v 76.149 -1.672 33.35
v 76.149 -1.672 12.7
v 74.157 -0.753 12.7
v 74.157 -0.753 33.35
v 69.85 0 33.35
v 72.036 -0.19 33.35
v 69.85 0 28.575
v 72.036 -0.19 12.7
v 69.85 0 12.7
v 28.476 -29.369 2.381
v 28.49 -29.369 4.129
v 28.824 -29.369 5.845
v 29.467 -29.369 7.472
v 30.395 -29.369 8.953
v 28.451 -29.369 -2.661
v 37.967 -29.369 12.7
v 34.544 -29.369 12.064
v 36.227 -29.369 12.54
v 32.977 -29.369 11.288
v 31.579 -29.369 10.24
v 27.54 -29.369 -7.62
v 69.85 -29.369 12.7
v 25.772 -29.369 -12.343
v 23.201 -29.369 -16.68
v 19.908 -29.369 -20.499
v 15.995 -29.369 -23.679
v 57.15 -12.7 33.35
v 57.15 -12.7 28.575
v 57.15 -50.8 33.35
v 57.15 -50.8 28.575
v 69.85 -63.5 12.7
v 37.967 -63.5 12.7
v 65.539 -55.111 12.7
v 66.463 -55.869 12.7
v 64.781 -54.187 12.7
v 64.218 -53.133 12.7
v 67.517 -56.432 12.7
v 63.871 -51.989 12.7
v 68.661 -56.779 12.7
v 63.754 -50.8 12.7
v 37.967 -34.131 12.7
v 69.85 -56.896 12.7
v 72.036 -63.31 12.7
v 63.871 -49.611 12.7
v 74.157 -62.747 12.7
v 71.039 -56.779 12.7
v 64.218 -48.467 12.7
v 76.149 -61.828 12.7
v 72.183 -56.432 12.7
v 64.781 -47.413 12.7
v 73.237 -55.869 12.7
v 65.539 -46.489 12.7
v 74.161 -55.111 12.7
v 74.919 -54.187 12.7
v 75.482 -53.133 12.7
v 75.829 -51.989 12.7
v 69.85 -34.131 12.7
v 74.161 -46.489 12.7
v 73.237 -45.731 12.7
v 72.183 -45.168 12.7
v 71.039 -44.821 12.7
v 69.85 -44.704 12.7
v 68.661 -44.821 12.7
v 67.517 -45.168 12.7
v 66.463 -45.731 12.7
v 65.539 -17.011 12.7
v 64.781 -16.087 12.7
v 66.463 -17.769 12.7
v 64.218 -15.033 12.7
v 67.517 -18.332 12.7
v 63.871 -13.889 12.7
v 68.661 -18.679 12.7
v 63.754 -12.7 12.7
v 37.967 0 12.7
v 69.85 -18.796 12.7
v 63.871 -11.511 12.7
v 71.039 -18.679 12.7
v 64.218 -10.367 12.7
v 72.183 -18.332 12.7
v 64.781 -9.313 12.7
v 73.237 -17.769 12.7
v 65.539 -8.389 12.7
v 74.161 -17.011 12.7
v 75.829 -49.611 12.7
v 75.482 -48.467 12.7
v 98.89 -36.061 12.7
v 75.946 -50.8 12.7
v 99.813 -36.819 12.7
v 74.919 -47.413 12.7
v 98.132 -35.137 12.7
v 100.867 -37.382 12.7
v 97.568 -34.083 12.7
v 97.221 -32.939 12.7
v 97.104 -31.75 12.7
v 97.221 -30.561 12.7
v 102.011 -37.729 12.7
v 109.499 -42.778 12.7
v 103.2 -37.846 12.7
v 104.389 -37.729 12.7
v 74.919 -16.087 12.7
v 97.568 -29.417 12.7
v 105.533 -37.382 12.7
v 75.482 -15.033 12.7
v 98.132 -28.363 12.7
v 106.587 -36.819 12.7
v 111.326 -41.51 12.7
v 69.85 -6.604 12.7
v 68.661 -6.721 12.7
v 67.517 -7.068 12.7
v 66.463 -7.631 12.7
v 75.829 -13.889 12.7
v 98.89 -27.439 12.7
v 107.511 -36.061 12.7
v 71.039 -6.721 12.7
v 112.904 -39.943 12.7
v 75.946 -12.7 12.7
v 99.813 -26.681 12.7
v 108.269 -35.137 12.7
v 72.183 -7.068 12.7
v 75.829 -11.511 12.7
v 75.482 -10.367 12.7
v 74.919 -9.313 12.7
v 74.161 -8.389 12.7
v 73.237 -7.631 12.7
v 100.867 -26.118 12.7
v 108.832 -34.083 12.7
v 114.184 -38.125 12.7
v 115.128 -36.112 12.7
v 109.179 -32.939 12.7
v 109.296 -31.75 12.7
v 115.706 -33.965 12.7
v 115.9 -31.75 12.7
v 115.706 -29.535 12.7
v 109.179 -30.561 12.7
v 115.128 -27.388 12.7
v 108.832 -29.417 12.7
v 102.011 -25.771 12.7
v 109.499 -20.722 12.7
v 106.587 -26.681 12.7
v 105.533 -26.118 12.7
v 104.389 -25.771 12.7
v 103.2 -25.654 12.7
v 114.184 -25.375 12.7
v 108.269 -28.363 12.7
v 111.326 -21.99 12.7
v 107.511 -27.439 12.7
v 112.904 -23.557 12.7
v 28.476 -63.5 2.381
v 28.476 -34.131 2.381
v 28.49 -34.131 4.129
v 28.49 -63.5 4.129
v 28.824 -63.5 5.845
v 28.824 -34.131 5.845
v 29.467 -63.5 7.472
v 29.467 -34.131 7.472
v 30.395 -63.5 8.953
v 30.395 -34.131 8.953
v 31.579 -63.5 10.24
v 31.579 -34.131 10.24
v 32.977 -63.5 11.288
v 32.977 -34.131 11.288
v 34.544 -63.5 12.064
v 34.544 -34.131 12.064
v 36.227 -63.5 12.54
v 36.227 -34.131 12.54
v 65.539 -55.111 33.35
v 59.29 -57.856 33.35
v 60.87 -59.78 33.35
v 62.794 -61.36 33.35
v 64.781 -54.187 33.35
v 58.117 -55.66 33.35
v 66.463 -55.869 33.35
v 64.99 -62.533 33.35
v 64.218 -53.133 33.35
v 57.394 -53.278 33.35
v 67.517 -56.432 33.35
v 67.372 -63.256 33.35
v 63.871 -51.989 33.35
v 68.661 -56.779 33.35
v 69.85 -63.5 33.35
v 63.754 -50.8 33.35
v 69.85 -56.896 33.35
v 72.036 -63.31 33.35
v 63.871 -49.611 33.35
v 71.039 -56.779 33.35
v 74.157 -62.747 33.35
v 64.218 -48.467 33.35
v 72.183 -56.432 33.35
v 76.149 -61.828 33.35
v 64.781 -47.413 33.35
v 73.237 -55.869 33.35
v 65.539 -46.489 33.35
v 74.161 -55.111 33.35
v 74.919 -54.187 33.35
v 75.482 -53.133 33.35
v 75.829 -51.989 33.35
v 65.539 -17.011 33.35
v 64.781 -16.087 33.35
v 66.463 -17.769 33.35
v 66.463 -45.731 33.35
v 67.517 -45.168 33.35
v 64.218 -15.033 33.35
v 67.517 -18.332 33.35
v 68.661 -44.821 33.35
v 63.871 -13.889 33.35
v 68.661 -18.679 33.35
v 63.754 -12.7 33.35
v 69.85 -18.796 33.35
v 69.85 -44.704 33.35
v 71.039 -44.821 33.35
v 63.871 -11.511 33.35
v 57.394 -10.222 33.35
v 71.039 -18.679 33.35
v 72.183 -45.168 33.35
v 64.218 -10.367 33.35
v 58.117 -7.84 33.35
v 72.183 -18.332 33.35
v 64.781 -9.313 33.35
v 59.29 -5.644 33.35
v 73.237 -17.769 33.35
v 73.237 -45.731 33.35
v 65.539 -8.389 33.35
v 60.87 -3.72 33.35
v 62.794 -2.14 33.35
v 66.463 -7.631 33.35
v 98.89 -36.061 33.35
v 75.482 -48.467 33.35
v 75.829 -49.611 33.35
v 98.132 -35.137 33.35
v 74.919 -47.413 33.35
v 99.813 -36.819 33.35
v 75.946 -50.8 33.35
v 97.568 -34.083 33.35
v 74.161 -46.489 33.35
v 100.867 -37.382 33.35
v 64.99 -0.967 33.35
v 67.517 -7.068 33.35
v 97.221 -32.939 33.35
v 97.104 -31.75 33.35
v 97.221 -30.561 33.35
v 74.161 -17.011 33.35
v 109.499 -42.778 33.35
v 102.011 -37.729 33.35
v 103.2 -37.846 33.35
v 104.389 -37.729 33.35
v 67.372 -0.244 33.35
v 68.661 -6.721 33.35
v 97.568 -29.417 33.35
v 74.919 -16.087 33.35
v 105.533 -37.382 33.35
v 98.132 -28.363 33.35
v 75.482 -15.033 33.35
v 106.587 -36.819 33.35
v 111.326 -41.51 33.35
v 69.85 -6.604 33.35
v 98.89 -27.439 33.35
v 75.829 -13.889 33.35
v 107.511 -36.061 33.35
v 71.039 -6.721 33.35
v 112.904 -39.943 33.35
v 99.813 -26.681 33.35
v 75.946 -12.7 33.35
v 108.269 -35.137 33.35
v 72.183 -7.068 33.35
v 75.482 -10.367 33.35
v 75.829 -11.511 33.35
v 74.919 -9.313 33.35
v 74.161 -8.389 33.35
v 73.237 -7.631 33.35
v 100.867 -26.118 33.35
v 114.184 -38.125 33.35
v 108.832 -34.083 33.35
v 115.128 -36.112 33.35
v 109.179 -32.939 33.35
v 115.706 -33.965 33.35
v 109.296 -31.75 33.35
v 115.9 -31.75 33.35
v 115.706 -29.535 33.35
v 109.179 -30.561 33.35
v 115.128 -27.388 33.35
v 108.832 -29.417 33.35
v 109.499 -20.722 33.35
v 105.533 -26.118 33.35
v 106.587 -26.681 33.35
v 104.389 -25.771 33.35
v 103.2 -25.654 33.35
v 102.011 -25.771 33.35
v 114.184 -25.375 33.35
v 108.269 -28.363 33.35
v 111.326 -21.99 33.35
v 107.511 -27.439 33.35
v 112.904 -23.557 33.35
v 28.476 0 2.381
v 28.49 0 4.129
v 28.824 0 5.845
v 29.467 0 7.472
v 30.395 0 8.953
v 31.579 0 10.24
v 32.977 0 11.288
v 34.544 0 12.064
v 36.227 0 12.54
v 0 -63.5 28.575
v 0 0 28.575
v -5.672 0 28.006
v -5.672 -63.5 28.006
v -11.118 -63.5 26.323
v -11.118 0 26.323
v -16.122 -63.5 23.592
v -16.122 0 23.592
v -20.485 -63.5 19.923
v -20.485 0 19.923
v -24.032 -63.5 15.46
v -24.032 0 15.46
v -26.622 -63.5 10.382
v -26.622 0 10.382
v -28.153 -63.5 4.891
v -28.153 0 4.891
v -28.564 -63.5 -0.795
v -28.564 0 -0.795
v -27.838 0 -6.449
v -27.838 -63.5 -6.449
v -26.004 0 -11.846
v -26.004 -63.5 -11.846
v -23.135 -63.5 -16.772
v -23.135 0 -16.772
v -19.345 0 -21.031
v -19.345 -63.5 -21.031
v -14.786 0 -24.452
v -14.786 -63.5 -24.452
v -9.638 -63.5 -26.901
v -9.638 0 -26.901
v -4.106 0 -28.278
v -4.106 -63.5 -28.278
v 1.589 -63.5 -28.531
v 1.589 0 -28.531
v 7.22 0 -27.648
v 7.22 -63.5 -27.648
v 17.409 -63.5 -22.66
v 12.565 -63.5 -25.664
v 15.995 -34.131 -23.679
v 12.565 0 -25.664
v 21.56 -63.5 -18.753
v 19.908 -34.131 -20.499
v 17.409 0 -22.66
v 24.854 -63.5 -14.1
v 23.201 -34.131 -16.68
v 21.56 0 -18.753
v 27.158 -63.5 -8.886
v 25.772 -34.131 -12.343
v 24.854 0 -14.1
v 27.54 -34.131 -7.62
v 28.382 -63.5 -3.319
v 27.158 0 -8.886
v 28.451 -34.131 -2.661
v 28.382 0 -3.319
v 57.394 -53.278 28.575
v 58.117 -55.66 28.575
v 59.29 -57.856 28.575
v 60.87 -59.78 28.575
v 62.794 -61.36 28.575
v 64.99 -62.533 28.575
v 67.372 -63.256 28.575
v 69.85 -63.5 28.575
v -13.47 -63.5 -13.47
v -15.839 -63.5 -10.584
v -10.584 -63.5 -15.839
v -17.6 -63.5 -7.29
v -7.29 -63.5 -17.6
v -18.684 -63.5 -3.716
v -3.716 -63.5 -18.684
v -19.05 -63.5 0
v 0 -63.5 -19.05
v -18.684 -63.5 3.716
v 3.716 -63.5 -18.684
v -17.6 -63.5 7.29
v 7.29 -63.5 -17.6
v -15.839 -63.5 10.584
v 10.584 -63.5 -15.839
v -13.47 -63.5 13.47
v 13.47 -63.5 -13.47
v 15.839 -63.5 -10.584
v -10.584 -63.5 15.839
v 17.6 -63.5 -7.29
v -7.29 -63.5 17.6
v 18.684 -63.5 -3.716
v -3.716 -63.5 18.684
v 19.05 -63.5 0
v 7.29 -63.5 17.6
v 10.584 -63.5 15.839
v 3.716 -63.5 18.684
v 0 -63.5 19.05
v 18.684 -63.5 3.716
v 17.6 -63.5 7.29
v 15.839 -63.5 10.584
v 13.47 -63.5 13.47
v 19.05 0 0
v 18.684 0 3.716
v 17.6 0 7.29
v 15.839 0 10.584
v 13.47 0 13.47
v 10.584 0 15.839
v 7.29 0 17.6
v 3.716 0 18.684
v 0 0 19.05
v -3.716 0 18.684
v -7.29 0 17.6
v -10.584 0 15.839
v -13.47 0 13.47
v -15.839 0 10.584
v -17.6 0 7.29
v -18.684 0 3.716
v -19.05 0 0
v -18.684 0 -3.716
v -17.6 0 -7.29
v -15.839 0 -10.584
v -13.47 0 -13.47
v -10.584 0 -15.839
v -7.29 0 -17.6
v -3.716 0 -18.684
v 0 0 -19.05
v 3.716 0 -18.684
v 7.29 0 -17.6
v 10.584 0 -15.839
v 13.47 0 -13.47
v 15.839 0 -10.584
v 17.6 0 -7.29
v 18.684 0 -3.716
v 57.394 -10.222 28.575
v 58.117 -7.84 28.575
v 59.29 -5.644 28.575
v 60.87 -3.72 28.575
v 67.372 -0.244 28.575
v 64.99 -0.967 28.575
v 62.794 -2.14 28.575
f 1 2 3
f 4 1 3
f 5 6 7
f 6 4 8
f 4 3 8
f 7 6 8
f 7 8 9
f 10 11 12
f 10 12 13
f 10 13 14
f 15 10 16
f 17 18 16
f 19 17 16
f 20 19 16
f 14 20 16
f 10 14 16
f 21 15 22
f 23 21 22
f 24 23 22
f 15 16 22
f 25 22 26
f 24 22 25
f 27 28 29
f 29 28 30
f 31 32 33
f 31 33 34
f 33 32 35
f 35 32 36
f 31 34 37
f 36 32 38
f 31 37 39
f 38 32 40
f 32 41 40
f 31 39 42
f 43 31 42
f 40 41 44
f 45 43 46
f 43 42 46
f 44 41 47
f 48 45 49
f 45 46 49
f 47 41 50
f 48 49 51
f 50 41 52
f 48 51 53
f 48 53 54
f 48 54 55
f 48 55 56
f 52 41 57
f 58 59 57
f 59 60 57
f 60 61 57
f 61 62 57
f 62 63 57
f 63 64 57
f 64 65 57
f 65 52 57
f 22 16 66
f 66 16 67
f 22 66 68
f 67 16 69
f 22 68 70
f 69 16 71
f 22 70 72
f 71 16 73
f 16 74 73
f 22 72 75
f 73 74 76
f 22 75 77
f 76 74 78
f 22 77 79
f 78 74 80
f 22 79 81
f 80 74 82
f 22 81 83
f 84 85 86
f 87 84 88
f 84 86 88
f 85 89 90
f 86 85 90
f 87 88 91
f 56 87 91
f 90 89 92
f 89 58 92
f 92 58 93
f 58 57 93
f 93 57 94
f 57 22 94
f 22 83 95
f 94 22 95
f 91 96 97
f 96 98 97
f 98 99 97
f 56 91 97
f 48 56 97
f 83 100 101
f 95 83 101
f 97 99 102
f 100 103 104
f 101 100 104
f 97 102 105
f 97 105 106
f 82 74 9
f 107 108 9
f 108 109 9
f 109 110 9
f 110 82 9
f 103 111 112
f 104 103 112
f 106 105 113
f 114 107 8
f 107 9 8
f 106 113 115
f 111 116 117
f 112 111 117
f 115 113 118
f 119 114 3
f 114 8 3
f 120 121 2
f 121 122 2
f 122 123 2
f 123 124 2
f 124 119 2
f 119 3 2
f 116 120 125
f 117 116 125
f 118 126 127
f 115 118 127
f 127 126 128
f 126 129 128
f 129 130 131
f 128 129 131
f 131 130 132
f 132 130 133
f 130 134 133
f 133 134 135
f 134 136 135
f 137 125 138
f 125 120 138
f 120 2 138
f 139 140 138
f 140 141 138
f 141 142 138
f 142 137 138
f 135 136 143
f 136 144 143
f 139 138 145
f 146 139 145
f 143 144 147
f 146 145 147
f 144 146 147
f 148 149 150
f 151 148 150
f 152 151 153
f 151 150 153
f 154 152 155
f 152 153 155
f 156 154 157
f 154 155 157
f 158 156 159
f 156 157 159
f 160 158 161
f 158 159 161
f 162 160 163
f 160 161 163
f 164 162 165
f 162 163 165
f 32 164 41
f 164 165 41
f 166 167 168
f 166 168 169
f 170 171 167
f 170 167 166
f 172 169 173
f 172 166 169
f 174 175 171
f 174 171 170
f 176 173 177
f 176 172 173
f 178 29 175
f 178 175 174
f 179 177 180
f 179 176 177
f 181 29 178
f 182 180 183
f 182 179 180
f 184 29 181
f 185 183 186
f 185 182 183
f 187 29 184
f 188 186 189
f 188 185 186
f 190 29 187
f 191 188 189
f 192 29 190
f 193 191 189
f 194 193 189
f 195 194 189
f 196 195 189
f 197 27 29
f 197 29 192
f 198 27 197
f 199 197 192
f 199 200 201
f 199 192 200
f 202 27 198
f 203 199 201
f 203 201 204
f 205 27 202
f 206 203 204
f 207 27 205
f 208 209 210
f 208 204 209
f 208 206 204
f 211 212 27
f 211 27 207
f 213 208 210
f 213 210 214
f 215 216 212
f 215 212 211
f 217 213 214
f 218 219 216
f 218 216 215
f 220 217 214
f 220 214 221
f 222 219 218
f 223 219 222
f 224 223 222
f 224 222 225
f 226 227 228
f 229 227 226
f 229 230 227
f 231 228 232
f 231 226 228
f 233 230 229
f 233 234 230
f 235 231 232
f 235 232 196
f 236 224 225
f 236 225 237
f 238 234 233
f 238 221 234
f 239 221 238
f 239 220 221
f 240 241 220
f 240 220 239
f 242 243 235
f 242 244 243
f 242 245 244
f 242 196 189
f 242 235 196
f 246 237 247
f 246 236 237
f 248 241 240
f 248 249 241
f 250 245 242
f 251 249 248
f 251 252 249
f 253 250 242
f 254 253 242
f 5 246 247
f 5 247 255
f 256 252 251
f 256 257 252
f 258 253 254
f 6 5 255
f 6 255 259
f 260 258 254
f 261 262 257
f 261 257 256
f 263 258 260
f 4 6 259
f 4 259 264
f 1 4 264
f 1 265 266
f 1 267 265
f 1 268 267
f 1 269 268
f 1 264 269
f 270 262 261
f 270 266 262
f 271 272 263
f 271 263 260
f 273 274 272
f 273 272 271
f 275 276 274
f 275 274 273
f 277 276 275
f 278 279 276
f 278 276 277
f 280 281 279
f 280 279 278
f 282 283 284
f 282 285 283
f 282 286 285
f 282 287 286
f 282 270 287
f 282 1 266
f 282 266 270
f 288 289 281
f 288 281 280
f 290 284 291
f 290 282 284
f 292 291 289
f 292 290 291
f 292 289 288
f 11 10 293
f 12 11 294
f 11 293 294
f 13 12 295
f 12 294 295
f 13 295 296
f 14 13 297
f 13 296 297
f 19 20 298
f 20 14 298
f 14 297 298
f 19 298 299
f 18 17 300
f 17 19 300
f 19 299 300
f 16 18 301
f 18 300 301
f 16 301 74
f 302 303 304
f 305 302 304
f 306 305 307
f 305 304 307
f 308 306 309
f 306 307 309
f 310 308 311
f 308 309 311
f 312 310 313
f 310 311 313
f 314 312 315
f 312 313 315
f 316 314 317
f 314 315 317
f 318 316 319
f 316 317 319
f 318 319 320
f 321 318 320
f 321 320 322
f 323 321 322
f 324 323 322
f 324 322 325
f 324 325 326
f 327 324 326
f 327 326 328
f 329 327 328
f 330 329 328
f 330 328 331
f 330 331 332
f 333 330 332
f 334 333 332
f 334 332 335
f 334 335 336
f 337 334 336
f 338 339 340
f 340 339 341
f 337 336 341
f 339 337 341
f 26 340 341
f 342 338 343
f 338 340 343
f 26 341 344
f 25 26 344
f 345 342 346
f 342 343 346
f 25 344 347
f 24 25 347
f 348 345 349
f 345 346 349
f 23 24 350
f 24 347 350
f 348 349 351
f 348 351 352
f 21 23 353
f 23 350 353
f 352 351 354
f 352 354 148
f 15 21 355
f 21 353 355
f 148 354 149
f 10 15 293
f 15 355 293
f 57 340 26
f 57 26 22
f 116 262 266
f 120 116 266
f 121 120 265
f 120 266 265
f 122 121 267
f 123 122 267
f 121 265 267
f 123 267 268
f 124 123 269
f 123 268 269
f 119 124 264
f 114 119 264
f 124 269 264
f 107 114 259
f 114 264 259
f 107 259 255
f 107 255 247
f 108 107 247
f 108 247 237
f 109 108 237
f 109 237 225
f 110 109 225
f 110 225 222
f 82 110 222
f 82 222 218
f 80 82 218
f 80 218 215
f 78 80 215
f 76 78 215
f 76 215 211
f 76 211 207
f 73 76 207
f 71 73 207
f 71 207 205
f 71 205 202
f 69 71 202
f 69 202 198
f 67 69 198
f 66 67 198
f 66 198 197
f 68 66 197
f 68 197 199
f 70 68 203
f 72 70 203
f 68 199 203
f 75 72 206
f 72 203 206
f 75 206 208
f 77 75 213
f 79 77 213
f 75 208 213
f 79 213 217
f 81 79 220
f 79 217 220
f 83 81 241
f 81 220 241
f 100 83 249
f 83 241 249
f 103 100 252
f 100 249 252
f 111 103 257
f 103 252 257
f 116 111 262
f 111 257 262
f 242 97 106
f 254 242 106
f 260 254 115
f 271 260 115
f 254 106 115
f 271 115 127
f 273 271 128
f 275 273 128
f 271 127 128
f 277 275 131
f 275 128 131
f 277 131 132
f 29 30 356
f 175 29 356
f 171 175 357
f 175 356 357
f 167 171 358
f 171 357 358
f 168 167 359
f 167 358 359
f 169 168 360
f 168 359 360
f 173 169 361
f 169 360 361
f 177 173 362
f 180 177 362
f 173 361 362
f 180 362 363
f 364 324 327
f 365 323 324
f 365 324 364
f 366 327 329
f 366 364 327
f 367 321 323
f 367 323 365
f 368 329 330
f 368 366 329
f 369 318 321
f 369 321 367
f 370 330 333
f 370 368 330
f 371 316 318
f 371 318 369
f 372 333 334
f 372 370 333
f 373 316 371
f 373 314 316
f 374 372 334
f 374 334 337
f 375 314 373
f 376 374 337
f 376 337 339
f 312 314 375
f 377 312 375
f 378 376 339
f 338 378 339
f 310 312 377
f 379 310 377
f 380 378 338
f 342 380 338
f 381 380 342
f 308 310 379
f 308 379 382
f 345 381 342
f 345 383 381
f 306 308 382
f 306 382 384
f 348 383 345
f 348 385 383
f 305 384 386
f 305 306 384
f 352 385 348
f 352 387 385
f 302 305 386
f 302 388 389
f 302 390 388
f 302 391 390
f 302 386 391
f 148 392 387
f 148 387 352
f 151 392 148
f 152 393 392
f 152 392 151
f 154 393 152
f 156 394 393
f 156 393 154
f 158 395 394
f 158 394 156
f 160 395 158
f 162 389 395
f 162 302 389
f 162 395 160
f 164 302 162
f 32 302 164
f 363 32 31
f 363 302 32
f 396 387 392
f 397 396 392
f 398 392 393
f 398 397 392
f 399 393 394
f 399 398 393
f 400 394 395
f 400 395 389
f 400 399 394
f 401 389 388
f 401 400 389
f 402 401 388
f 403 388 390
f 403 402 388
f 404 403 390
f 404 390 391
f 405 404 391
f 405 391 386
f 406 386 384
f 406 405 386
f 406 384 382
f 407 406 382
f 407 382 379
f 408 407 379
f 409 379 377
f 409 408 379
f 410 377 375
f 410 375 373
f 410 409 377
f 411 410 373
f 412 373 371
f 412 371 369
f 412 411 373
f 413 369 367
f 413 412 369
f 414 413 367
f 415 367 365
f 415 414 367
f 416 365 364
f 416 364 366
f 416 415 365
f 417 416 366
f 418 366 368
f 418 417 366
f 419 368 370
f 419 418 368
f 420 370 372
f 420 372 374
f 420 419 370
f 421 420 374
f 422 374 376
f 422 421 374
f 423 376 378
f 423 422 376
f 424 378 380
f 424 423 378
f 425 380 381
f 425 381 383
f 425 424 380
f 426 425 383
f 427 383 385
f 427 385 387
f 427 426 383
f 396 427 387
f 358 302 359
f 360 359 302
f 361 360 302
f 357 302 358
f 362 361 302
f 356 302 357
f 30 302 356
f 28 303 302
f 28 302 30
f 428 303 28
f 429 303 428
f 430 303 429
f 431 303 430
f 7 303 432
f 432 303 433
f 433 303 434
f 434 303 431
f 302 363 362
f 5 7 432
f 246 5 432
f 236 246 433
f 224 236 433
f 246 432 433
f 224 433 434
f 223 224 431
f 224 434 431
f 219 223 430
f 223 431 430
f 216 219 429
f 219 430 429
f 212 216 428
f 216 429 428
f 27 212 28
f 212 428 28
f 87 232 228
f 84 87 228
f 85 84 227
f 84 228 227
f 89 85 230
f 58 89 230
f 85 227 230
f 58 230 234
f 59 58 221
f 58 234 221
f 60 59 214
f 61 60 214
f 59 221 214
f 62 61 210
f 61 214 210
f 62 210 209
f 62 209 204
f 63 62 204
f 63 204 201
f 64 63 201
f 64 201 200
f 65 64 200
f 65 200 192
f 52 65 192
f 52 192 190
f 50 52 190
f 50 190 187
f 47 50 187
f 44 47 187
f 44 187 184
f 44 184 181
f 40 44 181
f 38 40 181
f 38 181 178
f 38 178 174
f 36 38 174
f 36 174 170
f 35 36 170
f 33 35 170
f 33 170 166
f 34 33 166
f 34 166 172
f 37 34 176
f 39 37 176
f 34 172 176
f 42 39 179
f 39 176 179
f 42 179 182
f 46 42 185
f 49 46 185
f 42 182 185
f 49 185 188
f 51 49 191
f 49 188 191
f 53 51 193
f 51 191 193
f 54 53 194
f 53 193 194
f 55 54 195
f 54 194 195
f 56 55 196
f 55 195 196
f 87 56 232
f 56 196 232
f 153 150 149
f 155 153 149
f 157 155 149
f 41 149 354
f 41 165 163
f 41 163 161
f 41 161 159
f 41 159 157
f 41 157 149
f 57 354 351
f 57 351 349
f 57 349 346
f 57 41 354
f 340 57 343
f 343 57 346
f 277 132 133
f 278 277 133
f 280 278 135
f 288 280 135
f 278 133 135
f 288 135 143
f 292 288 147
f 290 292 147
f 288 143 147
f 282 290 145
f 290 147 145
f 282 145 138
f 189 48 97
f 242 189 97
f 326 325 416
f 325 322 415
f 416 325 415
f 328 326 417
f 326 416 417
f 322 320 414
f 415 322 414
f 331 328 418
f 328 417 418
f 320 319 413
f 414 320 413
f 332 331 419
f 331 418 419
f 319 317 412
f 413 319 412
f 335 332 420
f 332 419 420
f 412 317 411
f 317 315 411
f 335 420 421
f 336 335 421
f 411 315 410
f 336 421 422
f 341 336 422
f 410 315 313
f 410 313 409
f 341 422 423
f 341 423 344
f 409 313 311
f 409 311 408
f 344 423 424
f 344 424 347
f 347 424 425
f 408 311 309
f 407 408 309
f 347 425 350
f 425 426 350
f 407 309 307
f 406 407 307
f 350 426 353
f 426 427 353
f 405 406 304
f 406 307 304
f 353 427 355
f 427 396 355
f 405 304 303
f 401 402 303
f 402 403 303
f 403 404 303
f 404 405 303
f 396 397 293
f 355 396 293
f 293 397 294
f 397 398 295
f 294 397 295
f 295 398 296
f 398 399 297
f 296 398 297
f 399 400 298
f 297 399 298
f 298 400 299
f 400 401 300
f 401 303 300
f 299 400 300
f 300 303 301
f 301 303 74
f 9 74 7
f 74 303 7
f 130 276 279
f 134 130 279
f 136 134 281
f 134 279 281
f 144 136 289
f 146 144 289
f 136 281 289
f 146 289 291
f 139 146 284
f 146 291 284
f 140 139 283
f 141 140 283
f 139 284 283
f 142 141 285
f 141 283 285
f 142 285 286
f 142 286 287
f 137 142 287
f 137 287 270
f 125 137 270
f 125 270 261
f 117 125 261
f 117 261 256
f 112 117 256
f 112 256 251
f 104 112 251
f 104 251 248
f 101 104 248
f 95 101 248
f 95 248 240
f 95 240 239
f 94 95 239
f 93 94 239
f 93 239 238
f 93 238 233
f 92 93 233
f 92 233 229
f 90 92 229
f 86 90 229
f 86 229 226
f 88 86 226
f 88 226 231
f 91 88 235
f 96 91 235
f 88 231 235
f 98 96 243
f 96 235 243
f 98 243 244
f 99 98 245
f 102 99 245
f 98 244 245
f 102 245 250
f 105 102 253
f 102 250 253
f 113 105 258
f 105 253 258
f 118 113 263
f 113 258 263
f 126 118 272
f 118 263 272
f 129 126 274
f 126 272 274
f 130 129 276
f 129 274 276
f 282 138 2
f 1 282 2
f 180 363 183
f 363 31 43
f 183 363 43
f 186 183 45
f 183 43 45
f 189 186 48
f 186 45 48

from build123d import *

# Parameters (mm, degrees)
F0_R          = 19.05
F1_DEPTH      = 63.5
F3_DEPTH      = 15.875
F3_DEPTH_BACK = 4.7752
F4_R          = 6.096
F5_DEPTH      = 61.9262
F8_DEPTH      = 2.38125


with BuildPart() as f1:
    # F0 (on Front) → F1 (new body)
    with BuildSketch(Plane.XZ):
        with BuildLine():
            Line((69.85, 28.575), (0, 28.575))
            ThreePointArc((0, 28.575), (-19.345366451, -21.0306305629), (28.4756083945, 2.38125))
            ThreePointArc((28.4756083945, 2.38125), (30.9572676717, 9.6234554837), (37.9674778593, 12.7))
            Line((37.9674778593, 12.7), (69.85, 12.7))
            Line((69.85, 12.7), (69.85, 28.575))
        make_face()
        Circle(F0_R, mode=Mode.SUBTRACT)
    extrude(amount=F1_DEPTH)

    # F2 (on face) → F3 (join, two sides)
    with BuildSketch(Plane.XY.offset(28.575)) as f3_sk:
        with BuildLine():
            ThreePointArc((76.1491554441, -1.6722785358), (73.1086759125, -0.4251871176), (69.85, 0))
            ThreePointArc((69.85, 0), (60.8697438789, -3.7197438789), (57.15, -12.7))
            Line((57.15, -12.7), (57.15, -31.75))
            Line((57.15, -31.75), (57.15, -50.8))
            ThreePointArc((57.15, -50.8), (60.8697438789, -59.7802561211), (69.85, -63.5))
            ThreePointArc((69.85, -63.5), (73.1086759125, -63.0748128824), (76.1491554441, -61.8277214642))
            Line((76.1491554441, -61.8277214642), (109.4993554441, -42.7777214642))
            ThreePointArc((109.4993554441, -42.7777214642), (114.1840352623, -38.1253715915), (115.9002, -31.75))
            ThreePointArc((115.9002, -31.75), (114.1840352623, -25.3746284085), (109.4993554441, -20.7222785358))
            Line((109.4993554441, -20.7222785358), (76.1491554441, -1.6722785358))
        make_face()
    extrude(amount=-F3_DEPTH)
    extrude(f3_sk.sketch, amount=F3_DEPTH_BACK)

    # F4 (on face) → F5 (cut, through all)
    with BuildSketch(Plane.XY.offset(33.3502)):
        with Locations((69.85, -12.7)):
            Circle(F4_R)
        with Locations((69.85, -50.8)):
            Circle(F4_R)
        with Locations((103.2002, -31.75)):
            Circle(F4_R)
    extrude(amount=-F5_DEPTH, mode=Mode.SUBTRACT)

    # F7 (on offset) → F8 (join, symmetric)
    with BuildSketch(Plane.XZ.offset(31.75)):
        with BuildLine():
            ThreePointArc((28.4756083945, 2.38125), (25.7719232537, -12.3425522809), (15.9950252975, -23.6788891364))
            Line((15.9950252975, -23.6788891364), (69.85, 12.7))
            Line((69.85, 12.7), (37.9674778593, 12.7))
            ThreePointArc((37.9674778593, 12.7), (30.9572676717, 9.6234554837), (28.4756083945, 2.38125))
        make_face()
    extrude(amount=F8_DEPTH, both=True)


solid = f1.part
